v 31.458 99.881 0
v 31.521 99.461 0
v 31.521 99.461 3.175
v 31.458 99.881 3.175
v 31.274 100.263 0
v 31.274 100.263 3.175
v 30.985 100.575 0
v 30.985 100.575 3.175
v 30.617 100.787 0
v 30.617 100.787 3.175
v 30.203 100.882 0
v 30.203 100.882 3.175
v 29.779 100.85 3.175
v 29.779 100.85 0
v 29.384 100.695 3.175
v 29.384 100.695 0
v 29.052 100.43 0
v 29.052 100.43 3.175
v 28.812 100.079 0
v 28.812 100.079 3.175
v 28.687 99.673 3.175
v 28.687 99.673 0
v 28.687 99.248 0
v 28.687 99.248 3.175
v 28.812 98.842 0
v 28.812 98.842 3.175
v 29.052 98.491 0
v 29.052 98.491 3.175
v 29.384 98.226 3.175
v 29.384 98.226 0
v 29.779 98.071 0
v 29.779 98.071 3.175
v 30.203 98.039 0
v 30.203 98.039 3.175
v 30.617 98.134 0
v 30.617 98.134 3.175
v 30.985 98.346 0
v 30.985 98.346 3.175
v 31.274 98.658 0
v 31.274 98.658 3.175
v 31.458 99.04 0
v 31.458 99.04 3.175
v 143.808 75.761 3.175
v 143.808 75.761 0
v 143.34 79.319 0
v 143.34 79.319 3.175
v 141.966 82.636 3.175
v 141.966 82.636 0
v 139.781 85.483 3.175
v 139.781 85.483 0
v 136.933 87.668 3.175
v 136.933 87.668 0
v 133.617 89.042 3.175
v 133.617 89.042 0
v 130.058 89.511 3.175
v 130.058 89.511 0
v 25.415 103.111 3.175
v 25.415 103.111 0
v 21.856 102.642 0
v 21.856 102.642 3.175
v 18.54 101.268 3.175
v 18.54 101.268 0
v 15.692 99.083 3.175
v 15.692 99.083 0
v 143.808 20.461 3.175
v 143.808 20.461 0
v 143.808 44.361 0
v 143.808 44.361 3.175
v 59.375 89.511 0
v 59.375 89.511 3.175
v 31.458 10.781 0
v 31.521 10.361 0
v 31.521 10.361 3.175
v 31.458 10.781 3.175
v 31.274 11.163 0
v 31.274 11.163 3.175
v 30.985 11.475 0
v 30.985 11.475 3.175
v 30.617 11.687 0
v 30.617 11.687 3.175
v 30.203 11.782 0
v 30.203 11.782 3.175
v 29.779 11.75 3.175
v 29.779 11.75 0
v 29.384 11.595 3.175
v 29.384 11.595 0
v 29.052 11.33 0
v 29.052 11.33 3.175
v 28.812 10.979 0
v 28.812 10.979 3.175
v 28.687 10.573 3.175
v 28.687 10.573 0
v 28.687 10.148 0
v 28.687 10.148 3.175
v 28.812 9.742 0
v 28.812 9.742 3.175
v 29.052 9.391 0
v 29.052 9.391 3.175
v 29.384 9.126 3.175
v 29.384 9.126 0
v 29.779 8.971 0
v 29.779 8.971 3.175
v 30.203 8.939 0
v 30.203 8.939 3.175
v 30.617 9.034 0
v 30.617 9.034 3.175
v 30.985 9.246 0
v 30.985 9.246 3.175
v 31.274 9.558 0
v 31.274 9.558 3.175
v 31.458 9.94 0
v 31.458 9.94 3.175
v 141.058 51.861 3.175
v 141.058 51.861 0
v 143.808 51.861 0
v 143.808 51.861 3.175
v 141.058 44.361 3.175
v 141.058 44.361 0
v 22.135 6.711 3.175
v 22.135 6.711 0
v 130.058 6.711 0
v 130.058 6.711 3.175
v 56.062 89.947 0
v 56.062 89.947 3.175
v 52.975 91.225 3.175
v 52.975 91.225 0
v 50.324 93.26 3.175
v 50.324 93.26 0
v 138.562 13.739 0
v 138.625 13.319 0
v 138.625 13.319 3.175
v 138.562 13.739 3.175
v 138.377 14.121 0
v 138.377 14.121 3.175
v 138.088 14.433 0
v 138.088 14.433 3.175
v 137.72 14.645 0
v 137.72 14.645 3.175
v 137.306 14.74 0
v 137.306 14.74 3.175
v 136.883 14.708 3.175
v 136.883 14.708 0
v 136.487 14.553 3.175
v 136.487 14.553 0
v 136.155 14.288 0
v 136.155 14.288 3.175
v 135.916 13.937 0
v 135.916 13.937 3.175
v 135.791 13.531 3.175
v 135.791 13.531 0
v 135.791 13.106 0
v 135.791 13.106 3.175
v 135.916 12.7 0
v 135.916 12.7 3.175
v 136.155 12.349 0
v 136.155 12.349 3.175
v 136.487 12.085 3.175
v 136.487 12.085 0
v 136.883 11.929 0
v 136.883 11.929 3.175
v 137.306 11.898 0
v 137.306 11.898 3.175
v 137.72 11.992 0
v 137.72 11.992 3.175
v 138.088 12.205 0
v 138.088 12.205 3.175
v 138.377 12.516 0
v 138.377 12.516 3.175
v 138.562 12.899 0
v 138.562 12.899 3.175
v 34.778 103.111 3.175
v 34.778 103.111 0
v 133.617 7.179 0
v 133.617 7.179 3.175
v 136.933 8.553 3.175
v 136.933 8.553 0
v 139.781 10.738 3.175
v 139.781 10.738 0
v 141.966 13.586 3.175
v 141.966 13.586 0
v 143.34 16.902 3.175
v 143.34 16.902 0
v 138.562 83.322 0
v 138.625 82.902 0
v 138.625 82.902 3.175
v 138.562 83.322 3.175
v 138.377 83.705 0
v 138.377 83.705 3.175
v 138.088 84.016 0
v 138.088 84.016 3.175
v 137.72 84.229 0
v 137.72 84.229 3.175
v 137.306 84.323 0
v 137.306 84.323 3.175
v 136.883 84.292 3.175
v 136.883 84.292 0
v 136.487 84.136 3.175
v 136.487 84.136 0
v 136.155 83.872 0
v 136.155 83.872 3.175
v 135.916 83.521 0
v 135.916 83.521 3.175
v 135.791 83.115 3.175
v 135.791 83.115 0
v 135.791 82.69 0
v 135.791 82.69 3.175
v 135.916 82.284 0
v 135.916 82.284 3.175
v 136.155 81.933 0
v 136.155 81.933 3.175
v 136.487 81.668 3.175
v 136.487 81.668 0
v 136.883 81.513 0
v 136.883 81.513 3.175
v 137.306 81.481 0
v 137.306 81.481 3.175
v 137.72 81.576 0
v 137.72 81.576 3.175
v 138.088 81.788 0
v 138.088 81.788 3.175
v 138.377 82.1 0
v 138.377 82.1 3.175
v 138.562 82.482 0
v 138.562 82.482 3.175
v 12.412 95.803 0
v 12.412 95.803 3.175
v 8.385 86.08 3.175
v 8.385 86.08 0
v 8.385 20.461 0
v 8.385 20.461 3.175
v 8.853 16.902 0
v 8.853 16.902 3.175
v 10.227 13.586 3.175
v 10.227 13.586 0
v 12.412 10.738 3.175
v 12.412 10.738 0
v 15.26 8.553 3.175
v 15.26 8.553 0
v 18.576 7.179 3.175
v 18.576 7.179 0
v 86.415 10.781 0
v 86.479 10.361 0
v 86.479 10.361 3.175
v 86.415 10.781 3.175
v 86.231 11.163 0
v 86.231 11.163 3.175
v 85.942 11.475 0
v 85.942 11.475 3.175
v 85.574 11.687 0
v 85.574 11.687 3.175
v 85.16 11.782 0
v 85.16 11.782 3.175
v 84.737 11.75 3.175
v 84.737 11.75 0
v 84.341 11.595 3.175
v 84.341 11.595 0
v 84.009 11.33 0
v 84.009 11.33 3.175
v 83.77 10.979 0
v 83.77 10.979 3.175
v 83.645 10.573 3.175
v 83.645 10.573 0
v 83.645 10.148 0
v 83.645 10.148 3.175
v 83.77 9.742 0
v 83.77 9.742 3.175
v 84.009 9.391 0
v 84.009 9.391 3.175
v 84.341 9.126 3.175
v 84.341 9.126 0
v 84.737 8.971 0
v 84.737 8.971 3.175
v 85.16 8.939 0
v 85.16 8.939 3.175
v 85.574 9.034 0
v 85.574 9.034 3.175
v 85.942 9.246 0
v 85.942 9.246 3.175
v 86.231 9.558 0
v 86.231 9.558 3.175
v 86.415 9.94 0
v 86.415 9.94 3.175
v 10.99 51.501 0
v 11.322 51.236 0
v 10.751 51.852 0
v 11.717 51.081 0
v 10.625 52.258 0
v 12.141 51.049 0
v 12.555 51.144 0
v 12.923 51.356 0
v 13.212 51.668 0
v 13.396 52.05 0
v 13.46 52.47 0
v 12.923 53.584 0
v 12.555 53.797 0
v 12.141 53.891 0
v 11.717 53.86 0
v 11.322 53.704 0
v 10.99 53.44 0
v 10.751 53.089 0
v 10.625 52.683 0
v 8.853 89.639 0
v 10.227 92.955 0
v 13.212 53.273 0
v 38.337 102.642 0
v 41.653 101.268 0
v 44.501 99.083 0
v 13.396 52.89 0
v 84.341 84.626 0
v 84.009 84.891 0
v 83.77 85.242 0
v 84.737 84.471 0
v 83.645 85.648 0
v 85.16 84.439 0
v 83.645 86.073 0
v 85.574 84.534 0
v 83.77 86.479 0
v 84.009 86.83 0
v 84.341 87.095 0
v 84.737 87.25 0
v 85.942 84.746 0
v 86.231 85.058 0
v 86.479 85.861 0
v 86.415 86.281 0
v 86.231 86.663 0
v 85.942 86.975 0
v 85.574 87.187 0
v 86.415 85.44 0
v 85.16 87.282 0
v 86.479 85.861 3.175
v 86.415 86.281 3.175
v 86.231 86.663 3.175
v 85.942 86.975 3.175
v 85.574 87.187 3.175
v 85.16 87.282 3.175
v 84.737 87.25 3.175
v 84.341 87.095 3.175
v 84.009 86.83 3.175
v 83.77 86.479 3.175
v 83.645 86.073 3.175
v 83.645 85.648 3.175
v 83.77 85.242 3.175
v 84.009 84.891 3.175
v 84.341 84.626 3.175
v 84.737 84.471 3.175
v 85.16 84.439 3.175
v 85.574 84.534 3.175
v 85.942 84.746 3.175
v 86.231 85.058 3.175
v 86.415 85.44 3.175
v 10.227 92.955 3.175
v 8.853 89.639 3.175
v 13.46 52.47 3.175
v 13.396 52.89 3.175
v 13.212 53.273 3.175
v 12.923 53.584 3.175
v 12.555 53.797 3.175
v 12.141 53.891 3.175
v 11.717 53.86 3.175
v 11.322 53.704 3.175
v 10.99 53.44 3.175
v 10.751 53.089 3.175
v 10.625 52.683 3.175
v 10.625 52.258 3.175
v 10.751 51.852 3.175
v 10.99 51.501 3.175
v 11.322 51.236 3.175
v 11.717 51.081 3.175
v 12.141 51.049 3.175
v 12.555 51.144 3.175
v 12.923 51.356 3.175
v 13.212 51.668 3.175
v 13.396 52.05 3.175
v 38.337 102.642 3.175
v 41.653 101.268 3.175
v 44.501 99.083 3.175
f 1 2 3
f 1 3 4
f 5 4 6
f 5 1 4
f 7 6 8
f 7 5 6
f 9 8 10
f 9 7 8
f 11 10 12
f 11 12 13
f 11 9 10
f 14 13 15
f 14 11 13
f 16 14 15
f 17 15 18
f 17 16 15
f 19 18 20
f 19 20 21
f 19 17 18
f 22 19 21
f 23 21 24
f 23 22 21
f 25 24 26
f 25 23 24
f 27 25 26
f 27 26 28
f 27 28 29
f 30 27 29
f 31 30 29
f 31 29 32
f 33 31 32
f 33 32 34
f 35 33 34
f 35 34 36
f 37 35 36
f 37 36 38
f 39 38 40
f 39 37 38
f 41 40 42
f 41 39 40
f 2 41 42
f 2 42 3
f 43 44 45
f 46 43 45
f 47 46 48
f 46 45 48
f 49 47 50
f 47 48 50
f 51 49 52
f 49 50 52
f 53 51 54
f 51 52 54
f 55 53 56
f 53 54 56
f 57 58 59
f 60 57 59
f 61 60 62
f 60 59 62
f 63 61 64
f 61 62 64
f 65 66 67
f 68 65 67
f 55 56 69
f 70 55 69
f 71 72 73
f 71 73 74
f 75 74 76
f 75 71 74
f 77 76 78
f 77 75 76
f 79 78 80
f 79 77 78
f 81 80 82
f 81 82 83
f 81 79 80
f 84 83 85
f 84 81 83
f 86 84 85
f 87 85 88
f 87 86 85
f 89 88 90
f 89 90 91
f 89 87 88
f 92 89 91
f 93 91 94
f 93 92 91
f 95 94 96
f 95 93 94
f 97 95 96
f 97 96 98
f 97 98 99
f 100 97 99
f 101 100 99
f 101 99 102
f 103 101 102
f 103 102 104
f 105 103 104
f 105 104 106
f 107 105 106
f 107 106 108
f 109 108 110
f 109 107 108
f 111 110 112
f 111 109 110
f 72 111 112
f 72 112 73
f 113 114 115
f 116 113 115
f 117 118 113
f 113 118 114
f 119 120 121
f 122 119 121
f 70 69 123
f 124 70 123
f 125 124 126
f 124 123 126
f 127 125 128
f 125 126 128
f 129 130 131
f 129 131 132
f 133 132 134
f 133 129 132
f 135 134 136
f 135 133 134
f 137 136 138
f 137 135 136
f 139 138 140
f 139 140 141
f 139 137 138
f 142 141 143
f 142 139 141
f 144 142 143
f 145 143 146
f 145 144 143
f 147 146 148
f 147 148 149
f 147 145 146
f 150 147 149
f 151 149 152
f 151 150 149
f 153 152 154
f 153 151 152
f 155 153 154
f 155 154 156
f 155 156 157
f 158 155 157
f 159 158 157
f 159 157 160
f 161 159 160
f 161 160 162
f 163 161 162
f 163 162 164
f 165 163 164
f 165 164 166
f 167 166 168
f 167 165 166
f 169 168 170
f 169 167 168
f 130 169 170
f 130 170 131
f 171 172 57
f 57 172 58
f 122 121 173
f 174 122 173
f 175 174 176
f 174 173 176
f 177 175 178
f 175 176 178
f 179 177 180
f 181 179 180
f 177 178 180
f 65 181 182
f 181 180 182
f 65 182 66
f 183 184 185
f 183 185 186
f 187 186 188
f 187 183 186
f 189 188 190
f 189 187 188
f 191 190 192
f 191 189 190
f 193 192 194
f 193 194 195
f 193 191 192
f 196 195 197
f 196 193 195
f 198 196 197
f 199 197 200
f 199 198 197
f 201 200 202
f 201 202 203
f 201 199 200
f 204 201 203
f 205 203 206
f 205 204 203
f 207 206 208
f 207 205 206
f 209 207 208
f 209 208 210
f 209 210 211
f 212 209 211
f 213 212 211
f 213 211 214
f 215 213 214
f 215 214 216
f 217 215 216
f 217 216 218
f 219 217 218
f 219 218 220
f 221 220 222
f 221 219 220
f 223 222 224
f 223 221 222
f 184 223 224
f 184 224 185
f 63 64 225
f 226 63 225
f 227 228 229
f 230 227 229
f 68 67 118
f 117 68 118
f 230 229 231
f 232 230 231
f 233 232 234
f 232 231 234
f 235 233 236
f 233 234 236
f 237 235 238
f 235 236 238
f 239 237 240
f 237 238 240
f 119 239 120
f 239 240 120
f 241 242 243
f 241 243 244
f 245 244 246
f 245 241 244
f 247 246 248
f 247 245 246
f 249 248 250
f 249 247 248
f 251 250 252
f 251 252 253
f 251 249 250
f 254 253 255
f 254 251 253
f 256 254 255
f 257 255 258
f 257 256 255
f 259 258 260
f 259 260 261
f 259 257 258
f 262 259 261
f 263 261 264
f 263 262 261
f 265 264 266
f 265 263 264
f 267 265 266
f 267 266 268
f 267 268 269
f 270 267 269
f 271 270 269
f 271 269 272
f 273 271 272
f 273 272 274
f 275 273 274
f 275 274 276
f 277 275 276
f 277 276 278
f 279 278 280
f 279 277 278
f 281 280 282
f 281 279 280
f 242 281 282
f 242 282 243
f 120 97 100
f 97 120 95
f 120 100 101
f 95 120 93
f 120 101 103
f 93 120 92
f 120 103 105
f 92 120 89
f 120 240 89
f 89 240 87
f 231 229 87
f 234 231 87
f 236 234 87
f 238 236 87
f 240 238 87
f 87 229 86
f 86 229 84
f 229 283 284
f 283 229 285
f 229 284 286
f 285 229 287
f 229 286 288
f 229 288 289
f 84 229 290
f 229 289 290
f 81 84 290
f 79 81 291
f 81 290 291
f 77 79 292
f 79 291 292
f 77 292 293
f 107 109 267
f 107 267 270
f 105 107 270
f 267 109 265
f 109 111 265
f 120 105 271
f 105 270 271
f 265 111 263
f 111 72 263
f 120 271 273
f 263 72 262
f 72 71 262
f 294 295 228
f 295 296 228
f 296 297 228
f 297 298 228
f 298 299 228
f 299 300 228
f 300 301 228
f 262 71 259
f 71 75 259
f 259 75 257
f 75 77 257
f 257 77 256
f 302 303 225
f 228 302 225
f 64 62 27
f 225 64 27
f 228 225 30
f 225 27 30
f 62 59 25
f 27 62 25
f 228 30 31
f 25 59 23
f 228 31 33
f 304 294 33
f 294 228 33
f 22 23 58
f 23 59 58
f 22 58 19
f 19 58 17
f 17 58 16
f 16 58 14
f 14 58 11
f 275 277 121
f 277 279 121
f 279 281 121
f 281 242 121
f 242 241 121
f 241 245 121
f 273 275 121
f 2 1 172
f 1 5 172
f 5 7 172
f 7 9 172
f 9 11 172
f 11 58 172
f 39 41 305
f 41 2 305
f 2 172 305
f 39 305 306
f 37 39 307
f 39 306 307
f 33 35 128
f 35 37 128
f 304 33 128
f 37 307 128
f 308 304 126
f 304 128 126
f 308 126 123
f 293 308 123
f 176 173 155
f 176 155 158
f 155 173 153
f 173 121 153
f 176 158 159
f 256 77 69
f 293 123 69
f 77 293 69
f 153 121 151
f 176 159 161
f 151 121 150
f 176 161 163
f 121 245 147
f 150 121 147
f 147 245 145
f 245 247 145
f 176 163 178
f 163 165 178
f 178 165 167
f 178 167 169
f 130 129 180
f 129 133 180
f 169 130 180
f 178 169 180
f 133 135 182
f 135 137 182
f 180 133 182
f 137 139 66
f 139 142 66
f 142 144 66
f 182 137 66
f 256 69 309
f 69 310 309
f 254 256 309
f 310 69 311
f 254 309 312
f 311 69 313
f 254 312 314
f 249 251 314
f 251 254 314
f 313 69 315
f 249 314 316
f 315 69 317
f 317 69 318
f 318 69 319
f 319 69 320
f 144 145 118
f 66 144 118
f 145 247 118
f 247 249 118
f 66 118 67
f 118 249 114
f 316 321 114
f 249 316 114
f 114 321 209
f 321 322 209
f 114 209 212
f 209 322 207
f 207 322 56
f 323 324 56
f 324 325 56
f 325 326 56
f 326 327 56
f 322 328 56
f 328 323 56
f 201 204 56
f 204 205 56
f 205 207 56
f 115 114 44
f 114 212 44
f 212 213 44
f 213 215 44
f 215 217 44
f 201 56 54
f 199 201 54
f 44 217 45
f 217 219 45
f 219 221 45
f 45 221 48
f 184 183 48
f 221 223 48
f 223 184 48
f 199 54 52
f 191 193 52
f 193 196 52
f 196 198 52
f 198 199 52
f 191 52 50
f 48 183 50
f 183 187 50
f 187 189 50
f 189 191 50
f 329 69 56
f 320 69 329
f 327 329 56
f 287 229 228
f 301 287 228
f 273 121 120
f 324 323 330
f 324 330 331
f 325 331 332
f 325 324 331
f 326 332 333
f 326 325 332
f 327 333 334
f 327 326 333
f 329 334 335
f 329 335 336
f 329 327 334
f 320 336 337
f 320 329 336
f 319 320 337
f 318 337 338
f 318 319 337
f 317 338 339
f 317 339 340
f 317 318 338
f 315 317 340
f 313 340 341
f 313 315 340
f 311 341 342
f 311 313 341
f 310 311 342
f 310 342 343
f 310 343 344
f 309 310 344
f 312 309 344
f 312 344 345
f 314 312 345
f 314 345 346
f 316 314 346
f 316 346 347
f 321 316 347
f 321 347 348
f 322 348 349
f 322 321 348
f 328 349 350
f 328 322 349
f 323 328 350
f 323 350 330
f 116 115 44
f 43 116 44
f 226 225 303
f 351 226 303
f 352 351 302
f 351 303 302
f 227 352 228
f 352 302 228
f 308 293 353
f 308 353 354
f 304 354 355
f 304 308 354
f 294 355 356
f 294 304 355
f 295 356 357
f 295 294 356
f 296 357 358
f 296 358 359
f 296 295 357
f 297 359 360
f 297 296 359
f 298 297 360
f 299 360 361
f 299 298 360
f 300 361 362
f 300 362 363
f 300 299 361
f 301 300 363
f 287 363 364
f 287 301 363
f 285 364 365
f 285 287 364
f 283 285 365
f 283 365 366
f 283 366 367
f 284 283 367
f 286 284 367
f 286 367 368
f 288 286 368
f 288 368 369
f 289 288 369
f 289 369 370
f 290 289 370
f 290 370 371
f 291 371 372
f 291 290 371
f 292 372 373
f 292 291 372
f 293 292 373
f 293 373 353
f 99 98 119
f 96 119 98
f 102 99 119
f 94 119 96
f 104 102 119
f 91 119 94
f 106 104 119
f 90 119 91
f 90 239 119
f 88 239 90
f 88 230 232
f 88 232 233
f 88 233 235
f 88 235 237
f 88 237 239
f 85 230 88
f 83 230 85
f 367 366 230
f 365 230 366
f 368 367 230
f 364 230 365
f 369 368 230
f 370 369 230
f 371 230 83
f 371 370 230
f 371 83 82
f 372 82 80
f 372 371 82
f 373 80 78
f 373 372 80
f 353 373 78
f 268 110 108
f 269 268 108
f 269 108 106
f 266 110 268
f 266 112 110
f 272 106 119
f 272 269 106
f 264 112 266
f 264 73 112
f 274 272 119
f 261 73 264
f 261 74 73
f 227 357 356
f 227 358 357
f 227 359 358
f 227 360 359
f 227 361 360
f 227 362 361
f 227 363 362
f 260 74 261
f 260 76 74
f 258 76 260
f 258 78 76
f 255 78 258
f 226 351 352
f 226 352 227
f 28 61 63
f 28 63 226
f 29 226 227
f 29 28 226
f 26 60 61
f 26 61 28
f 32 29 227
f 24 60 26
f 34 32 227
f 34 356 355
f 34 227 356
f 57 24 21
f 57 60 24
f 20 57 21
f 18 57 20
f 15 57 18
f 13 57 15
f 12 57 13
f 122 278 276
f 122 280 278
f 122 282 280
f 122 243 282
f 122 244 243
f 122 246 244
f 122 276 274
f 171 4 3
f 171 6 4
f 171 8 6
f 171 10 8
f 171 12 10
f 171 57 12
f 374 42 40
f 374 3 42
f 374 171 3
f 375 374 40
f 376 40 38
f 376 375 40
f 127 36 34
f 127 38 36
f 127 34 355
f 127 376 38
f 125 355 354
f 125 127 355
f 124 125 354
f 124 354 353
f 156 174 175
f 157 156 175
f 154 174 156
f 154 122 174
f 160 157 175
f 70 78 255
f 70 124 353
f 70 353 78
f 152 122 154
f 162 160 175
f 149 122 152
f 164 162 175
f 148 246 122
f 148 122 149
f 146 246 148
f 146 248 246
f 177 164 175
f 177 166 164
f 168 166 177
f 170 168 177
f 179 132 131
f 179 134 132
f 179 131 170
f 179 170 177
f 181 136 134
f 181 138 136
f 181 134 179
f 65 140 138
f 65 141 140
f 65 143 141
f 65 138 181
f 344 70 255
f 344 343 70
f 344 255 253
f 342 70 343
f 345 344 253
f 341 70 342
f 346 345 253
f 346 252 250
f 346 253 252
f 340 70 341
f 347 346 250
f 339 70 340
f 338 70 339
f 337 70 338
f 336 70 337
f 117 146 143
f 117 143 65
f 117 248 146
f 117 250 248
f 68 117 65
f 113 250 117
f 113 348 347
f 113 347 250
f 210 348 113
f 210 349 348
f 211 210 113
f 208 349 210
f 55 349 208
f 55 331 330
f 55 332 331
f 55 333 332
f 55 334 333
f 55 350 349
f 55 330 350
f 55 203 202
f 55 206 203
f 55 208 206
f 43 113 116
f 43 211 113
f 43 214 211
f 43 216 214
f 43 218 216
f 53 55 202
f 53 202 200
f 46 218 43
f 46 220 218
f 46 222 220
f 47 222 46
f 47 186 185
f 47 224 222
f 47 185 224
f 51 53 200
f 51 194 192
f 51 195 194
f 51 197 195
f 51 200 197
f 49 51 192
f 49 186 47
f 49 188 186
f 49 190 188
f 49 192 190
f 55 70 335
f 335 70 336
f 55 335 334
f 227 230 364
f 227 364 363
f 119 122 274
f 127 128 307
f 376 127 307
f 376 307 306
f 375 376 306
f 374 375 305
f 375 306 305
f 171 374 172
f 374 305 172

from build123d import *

# Parameters (mm, degrees)
SKETCH1_R           = 1.425
BOSS_EXTRUDE1_DEPTH = 3.175


with BuildPart() as part:
    # Sketch1 → Boss-Extrude1 (new body)
    with BuildSketch(Plane.XY):
        with BuildLine():
            Line((143.808069079, 20.460501739), (143.808069079, 44.360501739))
            Line((143.808069079, 44.360501739), (141.058069079, 44.360501739))
            Line((141.058069079, 44.360501739), (141.058069079, 51.860501739))
            Line((141.058069079, 51.860501739), (143.808069079, 51.860501739))
            Line((143.808069079, 51.860501739), (143.808069079, 75.76050174))
            ThreePointArc((143.808069079, 75.76050174), (139.780787321, 85.483219981), (130.058069079, 89.51050174))
            Line((130.058069079, 89.51050174), (59.375183039, 89.51050174))
            ThreePointArc((59.375183039, 89.51050174), (54.476835105, 90.484843724), (50.32421624, 93.259534941))
            Line((50.32421624, 93.259534941), (44.500531199, 99.083219981))
            ThreePointArc((44.500531199, 99.083219981), (40.039710153, 102.063845312), (34.777812958, 103.11050174))
            Line((34.777812958, 103.11050174), (25.414810921, 103.11050174))
            ThreePointArc((25.414810921, 103.11050174), (20.152913726, 102.063845312), (15.69209268, 99.083219981))
            Line((15.69209268, 99.083219981), (12.411836559, 95.80296386))
            ThreePointArc((12.411836559, 95.80296386), (9.431211228, 91.342142814), (8.3845548, 86.080245619))
            Line((8.3845548, 86.080245619), (8.3845548, 20.460501739))
            ThreePointArc((8.3845548, 20.460501739), (12.411836559, 10.737783497), (22.1345548, 6.710501739))
            Line((22.1345548, 6.710501739), (130.058069079, 6.710501739))
            ThreePointArc((130.058069079, 6.710501739), (139.780787321, 10.737783497), (143.808069079, 20.460501739))
        make_face()
        with Locations((12.0345548, 52.470373679)):
            Circle(SKETCH1_R, mode=Mode.SUBTRACT)
        with Locations((30.09631194, 99.46050174)):
            Circle(SKETCH1_R, mode=Mode.SUBTRACT)
        with Locations((85.053742799, 85.86050174)):
            Circle(SKETCH1_R, mode=Mode.SUBTRACT)
        with Locations((137.199847569, 82.902280229)):
            Circle(SKETCH1_R, mode=Mode.SUBTRACT)
        with Locations((137.199847569, 13.318723249)):
            Circle(SKETCH1_R, mode=Mode.SUBTRACT)
        with Locations((85.053742799, 10.36050174)):
            Circle(SKETCH1_R, mode=Mode.SUBTRACT)
        with Locations((30.09631194, 10.36050174)):
            Circle(SKETCH1_R, mode=Mode.SUBTRACT)
    extrude(amount=BOSS_EXTRUDE1_DEPTH)


solid = part.part
